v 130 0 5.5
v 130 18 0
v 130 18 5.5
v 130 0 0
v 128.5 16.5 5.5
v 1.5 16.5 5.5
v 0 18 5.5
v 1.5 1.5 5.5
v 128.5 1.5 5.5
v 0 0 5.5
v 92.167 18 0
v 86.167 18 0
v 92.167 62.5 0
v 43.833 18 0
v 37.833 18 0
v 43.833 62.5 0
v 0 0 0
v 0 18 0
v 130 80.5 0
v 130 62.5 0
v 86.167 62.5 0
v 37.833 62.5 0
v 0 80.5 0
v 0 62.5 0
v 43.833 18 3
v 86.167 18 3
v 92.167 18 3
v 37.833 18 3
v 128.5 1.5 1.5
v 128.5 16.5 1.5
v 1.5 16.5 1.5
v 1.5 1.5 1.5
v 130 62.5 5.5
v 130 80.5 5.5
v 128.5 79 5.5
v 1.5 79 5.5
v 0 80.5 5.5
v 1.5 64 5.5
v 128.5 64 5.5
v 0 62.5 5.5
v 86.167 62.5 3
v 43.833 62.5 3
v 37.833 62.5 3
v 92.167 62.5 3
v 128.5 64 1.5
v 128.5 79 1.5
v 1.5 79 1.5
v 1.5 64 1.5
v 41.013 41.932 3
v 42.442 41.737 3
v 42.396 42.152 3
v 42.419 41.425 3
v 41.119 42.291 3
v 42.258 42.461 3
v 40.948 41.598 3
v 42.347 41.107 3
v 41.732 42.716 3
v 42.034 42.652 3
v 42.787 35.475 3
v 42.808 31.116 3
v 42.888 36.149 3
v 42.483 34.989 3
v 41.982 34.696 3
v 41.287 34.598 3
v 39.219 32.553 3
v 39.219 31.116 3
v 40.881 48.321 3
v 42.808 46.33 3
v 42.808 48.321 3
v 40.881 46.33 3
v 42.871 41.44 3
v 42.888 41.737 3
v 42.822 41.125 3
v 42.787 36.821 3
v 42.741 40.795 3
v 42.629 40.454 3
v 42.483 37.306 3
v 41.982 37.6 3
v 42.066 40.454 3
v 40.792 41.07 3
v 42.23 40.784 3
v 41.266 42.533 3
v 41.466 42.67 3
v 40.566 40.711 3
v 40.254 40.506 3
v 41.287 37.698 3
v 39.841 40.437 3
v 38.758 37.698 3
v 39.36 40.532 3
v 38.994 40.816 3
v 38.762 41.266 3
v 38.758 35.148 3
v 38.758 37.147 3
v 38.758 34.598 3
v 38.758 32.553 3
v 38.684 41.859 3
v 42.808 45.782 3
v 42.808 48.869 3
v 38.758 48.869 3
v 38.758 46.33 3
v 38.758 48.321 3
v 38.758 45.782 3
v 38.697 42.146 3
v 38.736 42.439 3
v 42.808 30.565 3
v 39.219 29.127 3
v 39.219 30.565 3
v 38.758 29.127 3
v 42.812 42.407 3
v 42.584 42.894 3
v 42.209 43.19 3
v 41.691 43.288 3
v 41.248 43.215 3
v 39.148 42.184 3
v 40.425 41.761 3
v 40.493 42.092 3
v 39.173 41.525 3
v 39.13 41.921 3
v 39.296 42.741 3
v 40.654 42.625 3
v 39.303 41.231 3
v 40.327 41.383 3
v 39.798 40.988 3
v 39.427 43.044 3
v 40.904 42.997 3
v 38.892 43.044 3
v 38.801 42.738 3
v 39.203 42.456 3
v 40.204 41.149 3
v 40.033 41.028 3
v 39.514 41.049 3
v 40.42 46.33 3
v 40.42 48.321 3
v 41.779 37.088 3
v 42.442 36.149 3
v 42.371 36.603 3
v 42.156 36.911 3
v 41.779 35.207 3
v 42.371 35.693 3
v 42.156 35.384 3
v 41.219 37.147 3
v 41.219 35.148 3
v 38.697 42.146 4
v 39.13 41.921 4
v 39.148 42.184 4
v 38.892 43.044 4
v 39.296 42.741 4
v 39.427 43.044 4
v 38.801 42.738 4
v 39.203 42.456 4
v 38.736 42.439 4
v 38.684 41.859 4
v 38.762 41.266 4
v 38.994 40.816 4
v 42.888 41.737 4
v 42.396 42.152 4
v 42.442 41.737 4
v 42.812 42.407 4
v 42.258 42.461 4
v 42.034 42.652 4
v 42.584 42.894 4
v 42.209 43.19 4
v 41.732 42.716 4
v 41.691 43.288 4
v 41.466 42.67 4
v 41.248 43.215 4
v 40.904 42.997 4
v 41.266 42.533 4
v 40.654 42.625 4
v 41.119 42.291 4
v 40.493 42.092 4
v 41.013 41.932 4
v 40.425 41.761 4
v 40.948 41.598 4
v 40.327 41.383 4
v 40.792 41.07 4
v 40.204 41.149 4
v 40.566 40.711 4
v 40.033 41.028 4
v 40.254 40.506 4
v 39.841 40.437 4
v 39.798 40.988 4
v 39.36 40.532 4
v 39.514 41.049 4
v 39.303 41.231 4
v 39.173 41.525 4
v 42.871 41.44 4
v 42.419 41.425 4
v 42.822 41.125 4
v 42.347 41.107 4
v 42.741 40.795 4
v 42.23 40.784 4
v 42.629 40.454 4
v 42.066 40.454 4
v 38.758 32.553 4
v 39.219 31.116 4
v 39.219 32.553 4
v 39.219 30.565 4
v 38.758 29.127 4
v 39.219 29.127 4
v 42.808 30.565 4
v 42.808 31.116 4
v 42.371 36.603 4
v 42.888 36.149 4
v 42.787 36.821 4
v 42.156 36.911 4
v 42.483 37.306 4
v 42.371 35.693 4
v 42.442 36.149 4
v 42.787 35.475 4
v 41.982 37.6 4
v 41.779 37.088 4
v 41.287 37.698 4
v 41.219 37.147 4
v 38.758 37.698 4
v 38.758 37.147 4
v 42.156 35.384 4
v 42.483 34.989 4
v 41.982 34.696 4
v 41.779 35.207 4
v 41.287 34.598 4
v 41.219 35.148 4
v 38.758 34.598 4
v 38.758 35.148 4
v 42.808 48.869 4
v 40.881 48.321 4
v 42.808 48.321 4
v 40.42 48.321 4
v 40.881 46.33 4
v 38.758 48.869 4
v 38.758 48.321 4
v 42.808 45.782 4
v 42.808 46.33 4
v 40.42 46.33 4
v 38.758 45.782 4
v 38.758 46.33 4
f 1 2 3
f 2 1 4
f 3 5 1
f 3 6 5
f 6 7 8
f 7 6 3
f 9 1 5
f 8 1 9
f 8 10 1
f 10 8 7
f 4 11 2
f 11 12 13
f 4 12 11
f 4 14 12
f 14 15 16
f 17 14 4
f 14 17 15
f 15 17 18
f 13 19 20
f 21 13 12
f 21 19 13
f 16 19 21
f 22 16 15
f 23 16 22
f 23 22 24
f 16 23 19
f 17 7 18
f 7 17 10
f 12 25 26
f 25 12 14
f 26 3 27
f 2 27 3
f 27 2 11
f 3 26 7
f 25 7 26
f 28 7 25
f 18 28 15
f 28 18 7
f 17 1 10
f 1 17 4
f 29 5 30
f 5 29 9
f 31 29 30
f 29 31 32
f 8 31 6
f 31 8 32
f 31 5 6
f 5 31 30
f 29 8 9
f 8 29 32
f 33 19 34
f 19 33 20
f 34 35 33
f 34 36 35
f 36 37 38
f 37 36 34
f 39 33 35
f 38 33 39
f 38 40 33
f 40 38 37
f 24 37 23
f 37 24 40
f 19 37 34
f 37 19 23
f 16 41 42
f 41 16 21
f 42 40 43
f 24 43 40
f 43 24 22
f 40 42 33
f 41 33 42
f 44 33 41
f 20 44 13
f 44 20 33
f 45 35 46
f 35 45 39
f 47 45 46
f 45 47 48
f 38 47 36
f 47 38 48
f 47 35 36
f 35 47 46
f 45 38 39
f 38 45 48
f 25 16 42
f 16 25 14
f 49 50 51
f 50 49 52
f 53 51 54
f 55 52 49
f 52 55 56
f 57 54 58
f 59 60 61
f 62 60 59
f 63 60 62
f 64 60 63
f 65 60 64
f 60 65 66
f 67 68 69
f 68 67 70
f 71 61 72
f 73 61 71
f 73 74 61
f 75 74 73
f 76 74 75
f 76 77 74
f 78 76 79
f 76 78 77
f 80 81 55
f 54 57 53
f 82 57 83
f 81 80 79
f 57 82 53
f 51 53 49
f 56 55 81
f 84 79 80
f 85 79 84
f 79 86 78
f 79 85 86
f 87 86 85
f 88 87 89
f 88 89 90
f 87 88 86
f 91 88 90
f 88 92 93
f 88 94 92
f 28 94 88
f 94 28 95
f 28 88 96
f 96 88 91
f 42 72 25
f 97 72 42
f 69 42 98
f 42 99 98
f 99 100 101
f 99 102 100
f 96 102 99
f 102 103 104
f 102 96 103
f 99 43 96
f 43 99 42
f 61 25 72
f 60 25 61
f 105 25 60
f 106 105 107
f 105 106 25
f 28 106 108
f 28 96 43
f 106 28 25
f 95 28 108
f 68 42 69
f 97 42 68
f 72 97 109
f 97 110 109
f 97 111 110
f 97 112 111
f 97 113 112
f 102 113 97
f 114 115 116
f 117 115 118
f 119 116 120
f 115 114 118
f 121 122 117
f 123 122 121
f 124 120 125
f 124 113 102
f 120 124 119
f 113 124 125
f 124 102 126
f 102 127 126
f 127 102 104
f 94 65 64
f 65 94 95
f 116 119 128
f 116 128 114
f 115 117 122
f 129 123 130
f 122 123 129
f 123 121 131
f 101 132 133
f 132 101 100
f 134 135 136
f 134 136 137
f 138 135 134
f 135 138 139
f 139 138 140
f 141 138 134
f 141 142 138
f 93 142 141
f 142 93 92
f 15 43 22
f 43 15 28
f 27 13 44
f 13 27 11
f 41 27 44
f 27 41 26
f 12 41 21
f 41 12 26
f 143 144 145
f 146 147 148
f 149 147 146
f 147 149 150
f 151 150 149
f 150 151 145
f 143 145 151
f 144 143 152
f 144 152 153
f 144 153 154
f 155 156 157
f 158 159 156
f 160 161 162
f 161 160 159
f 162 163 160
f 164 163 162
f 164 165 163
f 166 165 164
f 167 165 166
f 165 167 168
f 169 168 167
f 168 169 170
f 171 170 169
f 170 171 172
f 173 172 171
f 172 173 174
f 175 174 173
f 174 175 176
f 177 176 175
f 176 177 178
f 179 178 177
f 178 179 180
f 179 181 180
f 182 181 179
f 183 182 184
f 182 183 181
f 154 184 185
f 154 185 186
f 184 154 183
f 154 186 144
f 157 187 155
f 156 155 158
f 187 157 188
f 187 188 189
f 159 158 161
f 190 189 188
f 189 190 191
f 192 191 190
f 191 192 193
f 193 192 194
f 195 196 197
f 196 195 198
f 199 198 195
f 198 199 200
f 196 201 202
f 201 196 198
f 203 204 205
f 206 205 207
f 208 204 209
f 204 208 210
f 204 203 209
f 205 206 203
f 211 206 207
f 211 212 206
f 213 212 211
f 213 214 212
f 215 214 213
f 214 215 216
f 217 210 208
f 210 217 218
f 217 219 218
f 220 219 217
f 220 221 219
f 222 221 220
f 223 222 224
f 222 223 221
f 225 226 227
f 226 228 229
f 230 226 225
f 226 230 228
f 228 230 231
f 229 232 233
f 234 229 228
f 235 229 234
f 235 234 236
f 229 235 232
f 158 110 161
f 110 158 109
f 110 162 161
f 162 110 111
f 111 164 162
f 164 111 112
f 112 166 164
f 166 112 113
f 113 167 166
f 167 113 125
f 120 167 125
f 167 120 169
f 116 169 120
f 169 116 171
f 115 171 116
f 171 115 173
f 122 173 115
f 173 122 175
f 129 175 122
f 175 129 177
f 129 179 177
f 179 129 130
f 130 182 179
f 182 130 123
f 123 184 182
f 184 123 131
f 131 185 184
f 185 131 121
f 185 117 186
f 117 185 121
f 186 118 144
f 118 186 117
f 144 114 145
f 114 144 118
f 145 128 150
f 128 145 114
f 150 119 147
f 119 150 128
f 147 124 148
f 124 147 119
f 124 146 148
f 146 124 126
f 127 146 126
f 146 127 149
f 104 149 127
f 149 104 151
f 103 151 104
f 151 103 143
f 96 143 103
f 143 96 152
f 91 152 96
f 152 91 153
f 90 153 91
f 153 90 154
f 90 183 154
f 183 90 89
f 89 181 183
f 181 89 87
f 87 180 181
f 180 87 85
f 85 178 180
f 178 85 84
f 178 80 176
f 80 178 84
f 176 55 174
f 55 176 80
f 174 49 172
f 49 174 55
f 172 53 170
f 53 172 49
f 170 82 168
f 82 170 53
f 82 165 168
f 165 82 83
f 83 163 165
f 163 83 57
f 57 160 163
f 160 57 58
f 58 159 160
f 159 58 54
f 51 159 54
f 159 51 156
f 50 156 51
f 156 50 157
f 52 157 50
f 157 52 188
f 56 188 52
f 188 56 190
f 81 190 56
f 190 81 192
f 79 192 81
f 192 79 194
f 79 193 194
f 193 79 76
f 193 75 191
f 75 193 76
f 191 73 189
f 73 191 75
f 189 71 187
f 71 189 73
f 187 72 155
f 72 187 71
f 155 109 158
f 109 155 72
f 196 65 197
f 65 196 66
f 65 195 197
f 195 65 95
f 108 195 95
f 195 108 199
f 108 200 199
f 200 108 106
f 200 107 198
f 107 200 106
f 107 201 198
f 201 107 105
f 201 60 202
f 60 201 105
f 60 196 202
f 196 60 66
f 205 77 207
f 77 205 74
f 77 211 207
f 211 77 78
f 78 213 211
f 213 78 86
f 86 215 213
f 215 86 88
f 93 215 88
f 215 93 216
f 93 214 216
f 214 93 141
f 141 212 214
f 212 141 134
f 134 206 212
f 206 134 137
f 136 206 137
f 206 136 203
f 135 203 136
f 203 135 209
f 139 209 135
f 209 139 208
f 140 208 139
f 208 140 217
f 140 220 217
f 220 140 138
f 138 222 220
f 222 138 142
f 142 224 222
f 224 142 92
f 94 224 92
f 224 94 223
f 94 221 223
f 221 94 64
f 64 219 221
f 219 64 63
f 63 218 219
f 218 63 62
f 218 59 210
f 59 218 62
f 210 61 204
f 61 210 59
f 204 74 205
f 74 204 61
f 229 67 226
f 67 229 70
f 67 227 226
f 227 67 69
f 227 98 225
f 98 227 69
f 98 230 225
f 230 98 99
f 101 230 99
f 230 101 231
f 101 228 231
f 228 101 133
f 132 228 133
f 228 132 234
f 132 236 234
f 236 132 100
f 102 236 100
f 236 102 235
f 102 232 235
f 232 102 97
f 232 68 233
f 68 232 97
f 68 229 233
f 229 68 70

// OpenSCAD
//#############################################################################
//
// Customizable TUSH base
// ======================
//
// Impressed with the TUSH but I found them to be a little unstable on their own. I looked for a base for them
// but most came in sizes which I have never seen here in the UK. So I decided to design my own parametric version
// and this is the result.
// This is still work in progress and I am also open to suggestions.
// The width is the spool walls, centre to centre.
//
// Author: Dave Johns 2018
// Licensed under the Creative Commons - Attribution-NonCommercial 4.0 International (CC BY-NC 4.0). 
// https://creativecommons.org/licenses/by-nc/4.0/
//
//#############################################################################width=62.5

// Width of the spool centre to centre
width = 62.5; // 1Kg standard spool
//width = 47; // 750g spool
wall_thickness = 1.5;
wall_height = 4;
stretcher_width = 6;
stretcher_height = 3;
font = "Comic Sans";
font_size = 4;
spacing = 1.5;
text = "TUSH";
tush_length = 127;
tush_width = 15;

foot();
translate([0, width, 0])
    foot();
translate([(tush_length / 3) + wall_thickness - stretcher_width, tush_width + (2 * wall_thickness), 0])
    cube([stretcher_width, width - tush_width - (2 * wall_thickness), stretcher_height]);
translate([(2 * tush_length / 3) + wall_thickness, tush_width + (2 * wall_thickness), 0])
    cube([stretcher_width, width - tush_width - (2 * wall_thickness), stretcher_height]);
translate([(tush_length / 3) + wall_thickness - (stretcher_width / 2), wall_thickness + (width + tush_width) / 2, stretcher_height]) linear_extrude(1) rotate([0, 0, 90]) text(text,size=font_size,font=font,halign="center",valign="center",spacing=spacing);

module foot() {
    difference() {
        cube([tush_length + (2 * wall_thickness), tush_width + (2 * wall_thickness), wall_height + wall_thickness], false);
        translate([wall_thickness, wall_thickness, wall_thickness])
            cube([tush_length, tush_width, wall_height+1], false);
    }
}
